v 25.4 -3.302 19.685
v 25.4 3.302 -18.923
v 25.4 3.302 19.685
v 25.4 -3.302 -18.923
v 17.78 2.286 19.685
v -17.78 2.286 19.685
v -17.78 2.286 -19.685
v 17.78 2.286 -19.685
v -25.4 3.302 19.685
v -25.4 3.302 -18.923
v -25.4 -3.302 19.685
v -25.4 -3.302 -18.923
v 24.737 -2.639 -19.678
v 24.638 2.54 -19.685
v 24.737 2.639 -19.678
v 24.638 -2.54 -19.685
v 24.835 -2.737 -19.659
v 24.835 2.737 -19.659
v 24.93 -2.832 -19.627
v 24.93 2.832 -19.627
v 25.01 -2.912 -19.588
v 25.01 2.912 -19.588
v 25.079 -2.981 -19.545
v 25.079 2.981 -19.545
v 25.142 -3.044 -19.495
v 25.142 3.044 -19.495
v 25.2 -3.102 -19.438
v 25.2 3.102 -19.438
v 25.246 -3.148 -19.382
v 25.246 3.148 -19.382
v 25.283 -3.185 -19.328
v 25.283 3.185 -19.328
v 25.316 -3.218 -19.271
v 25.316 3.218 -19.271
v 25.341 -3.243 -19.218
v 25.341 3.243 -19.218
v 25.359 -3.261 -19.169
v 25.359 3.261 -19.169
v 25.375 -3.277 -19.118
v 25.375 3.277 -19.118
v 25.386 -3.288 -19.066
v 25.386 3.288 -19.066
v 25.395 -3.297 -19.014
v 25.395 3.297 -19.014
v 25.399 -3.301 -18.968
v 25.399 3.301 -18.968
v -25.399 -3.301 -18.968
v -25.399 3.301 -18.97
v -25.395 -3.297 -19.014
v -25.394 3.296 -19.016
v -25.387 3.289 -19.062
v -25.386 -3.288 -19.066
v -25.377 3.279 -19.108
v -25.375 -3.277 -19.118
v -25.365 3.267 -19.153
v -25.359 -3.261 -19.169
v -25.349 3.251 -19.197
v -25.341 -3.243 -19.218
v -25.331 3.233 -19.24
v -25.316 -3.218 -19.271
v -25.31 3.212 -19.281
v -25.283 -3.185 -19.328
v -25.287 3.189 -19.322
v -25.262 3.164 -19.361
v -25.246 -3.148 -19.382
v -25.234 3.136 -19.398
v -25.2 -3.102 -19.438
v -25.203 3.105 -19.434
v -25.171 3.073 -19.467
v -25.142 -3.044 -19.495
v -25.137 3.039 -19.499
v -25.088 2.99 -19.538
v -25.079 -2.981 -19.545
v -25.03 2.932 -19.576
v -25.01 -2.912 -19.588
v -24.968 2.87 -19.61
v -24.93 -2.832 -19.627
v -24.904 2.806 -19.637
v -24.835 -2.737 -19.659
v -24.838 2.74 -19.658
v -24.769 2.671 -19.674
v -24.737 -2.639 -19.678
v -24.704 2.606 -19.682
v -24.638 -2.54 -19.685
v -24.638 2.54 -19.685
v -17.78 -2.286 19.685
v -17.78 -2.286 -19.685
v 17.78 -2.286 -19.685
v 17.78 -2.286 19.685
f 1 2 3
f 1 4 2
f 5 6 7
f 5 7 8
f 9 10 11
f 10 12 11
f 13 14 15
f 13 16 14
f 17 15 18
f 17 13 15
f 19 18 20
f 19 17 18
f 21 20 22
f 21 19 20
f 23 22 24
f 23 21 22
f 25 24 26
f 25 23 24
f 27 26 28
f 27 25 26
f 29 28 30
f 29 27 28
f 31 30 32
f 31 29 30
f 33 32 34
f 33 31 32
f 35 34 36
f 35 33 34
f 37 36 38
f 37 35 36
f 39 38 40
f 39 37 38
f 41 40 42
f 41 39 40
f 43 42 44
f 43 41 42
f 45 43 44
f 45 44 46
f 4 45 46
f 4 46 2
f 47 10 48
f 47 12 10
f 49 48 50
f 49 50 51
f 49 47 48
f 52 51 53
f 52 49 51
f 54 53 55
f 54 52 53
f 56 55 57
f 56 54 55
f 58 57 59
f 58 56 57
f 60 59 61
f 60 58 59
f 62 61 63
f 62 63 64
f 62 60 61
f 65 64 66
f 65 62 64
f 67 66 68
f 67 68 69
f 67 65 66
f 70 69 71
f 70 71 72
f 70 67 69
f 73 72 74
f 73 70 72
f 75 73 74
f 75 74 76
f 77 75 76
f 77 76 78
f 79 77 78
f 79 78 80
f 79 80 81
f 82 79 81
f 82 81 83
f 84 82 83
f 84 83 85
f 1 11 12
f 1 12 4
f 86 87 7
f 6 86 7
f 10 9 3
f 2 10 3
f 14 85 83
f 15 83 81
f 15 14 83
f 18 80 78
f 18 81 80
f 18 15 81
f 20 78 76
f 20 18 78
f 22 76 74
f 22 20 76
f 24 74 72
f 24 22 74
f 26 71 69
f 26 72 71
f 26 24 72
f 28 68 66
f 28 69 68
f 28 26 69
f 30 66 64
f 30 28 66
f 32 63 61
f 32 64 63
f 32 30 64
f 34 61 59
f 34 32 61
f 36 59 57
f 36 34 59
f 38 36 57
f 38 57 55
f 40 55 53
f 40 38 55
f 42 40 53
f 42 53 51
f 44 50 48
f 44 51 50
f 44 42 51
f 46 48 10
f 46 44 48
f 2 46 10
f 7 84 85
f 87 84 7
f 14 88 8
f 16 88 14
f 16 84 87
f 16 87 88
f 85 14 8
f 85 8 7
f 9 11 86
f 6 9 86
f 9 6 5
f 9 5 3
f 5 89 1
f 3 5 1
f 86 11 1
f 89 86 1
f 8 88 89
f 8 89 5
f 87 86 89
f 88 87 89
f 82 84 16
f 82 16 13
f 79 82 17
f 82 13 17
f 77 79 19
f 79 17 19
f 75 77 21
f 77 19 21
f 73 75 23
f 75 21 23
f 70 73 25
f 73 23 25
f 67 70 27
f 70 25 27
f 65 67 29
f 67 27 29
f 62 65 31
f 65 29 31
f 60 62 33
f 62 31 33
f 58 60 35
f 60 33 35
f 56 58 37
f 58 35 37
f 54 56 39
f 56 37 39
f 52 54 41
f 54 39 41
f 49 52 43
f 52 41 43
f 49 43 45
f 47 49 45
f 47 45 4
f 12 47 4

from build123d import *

# Parameters (mm, degrees)
F0_W     = 50.8
F0_H     = 39.37
F1_DEPTH = 3.302
F2_W     = 35.56
F2_H     = 4.572
F3_DEPTH = 39.37
F4_R     = 0.762


with BuildPart() as f1:
    # F0 (on Front) → F1 (new body, symmetric)
    with BuildSketch(Plane.XZ):
        Rectangle(F0_W, F0_H)
    extrude(amount=F1_DEPTH, both=True)

    # F2 (on face) → F3 (cut)
    with BuildSketch(Plane.XY.offset(19.685)):
        Rectangle(F2_W, F2_H)
    extrude(amount=-F3_DEPTH, mode=Mode.SUBTRACT)

    # F4
    f4_edges = [f1.edges().sort_by_distance(p)[0] for p in [
        (0, -3.302, -19.685),
        (-25.4, 0, -19.685),
        (0, 3.302, -19.685),
        (25.4, 0, -19.685),
    ]]
    fillet(f4_edges, radius=F4_R)


solid = f1.part
